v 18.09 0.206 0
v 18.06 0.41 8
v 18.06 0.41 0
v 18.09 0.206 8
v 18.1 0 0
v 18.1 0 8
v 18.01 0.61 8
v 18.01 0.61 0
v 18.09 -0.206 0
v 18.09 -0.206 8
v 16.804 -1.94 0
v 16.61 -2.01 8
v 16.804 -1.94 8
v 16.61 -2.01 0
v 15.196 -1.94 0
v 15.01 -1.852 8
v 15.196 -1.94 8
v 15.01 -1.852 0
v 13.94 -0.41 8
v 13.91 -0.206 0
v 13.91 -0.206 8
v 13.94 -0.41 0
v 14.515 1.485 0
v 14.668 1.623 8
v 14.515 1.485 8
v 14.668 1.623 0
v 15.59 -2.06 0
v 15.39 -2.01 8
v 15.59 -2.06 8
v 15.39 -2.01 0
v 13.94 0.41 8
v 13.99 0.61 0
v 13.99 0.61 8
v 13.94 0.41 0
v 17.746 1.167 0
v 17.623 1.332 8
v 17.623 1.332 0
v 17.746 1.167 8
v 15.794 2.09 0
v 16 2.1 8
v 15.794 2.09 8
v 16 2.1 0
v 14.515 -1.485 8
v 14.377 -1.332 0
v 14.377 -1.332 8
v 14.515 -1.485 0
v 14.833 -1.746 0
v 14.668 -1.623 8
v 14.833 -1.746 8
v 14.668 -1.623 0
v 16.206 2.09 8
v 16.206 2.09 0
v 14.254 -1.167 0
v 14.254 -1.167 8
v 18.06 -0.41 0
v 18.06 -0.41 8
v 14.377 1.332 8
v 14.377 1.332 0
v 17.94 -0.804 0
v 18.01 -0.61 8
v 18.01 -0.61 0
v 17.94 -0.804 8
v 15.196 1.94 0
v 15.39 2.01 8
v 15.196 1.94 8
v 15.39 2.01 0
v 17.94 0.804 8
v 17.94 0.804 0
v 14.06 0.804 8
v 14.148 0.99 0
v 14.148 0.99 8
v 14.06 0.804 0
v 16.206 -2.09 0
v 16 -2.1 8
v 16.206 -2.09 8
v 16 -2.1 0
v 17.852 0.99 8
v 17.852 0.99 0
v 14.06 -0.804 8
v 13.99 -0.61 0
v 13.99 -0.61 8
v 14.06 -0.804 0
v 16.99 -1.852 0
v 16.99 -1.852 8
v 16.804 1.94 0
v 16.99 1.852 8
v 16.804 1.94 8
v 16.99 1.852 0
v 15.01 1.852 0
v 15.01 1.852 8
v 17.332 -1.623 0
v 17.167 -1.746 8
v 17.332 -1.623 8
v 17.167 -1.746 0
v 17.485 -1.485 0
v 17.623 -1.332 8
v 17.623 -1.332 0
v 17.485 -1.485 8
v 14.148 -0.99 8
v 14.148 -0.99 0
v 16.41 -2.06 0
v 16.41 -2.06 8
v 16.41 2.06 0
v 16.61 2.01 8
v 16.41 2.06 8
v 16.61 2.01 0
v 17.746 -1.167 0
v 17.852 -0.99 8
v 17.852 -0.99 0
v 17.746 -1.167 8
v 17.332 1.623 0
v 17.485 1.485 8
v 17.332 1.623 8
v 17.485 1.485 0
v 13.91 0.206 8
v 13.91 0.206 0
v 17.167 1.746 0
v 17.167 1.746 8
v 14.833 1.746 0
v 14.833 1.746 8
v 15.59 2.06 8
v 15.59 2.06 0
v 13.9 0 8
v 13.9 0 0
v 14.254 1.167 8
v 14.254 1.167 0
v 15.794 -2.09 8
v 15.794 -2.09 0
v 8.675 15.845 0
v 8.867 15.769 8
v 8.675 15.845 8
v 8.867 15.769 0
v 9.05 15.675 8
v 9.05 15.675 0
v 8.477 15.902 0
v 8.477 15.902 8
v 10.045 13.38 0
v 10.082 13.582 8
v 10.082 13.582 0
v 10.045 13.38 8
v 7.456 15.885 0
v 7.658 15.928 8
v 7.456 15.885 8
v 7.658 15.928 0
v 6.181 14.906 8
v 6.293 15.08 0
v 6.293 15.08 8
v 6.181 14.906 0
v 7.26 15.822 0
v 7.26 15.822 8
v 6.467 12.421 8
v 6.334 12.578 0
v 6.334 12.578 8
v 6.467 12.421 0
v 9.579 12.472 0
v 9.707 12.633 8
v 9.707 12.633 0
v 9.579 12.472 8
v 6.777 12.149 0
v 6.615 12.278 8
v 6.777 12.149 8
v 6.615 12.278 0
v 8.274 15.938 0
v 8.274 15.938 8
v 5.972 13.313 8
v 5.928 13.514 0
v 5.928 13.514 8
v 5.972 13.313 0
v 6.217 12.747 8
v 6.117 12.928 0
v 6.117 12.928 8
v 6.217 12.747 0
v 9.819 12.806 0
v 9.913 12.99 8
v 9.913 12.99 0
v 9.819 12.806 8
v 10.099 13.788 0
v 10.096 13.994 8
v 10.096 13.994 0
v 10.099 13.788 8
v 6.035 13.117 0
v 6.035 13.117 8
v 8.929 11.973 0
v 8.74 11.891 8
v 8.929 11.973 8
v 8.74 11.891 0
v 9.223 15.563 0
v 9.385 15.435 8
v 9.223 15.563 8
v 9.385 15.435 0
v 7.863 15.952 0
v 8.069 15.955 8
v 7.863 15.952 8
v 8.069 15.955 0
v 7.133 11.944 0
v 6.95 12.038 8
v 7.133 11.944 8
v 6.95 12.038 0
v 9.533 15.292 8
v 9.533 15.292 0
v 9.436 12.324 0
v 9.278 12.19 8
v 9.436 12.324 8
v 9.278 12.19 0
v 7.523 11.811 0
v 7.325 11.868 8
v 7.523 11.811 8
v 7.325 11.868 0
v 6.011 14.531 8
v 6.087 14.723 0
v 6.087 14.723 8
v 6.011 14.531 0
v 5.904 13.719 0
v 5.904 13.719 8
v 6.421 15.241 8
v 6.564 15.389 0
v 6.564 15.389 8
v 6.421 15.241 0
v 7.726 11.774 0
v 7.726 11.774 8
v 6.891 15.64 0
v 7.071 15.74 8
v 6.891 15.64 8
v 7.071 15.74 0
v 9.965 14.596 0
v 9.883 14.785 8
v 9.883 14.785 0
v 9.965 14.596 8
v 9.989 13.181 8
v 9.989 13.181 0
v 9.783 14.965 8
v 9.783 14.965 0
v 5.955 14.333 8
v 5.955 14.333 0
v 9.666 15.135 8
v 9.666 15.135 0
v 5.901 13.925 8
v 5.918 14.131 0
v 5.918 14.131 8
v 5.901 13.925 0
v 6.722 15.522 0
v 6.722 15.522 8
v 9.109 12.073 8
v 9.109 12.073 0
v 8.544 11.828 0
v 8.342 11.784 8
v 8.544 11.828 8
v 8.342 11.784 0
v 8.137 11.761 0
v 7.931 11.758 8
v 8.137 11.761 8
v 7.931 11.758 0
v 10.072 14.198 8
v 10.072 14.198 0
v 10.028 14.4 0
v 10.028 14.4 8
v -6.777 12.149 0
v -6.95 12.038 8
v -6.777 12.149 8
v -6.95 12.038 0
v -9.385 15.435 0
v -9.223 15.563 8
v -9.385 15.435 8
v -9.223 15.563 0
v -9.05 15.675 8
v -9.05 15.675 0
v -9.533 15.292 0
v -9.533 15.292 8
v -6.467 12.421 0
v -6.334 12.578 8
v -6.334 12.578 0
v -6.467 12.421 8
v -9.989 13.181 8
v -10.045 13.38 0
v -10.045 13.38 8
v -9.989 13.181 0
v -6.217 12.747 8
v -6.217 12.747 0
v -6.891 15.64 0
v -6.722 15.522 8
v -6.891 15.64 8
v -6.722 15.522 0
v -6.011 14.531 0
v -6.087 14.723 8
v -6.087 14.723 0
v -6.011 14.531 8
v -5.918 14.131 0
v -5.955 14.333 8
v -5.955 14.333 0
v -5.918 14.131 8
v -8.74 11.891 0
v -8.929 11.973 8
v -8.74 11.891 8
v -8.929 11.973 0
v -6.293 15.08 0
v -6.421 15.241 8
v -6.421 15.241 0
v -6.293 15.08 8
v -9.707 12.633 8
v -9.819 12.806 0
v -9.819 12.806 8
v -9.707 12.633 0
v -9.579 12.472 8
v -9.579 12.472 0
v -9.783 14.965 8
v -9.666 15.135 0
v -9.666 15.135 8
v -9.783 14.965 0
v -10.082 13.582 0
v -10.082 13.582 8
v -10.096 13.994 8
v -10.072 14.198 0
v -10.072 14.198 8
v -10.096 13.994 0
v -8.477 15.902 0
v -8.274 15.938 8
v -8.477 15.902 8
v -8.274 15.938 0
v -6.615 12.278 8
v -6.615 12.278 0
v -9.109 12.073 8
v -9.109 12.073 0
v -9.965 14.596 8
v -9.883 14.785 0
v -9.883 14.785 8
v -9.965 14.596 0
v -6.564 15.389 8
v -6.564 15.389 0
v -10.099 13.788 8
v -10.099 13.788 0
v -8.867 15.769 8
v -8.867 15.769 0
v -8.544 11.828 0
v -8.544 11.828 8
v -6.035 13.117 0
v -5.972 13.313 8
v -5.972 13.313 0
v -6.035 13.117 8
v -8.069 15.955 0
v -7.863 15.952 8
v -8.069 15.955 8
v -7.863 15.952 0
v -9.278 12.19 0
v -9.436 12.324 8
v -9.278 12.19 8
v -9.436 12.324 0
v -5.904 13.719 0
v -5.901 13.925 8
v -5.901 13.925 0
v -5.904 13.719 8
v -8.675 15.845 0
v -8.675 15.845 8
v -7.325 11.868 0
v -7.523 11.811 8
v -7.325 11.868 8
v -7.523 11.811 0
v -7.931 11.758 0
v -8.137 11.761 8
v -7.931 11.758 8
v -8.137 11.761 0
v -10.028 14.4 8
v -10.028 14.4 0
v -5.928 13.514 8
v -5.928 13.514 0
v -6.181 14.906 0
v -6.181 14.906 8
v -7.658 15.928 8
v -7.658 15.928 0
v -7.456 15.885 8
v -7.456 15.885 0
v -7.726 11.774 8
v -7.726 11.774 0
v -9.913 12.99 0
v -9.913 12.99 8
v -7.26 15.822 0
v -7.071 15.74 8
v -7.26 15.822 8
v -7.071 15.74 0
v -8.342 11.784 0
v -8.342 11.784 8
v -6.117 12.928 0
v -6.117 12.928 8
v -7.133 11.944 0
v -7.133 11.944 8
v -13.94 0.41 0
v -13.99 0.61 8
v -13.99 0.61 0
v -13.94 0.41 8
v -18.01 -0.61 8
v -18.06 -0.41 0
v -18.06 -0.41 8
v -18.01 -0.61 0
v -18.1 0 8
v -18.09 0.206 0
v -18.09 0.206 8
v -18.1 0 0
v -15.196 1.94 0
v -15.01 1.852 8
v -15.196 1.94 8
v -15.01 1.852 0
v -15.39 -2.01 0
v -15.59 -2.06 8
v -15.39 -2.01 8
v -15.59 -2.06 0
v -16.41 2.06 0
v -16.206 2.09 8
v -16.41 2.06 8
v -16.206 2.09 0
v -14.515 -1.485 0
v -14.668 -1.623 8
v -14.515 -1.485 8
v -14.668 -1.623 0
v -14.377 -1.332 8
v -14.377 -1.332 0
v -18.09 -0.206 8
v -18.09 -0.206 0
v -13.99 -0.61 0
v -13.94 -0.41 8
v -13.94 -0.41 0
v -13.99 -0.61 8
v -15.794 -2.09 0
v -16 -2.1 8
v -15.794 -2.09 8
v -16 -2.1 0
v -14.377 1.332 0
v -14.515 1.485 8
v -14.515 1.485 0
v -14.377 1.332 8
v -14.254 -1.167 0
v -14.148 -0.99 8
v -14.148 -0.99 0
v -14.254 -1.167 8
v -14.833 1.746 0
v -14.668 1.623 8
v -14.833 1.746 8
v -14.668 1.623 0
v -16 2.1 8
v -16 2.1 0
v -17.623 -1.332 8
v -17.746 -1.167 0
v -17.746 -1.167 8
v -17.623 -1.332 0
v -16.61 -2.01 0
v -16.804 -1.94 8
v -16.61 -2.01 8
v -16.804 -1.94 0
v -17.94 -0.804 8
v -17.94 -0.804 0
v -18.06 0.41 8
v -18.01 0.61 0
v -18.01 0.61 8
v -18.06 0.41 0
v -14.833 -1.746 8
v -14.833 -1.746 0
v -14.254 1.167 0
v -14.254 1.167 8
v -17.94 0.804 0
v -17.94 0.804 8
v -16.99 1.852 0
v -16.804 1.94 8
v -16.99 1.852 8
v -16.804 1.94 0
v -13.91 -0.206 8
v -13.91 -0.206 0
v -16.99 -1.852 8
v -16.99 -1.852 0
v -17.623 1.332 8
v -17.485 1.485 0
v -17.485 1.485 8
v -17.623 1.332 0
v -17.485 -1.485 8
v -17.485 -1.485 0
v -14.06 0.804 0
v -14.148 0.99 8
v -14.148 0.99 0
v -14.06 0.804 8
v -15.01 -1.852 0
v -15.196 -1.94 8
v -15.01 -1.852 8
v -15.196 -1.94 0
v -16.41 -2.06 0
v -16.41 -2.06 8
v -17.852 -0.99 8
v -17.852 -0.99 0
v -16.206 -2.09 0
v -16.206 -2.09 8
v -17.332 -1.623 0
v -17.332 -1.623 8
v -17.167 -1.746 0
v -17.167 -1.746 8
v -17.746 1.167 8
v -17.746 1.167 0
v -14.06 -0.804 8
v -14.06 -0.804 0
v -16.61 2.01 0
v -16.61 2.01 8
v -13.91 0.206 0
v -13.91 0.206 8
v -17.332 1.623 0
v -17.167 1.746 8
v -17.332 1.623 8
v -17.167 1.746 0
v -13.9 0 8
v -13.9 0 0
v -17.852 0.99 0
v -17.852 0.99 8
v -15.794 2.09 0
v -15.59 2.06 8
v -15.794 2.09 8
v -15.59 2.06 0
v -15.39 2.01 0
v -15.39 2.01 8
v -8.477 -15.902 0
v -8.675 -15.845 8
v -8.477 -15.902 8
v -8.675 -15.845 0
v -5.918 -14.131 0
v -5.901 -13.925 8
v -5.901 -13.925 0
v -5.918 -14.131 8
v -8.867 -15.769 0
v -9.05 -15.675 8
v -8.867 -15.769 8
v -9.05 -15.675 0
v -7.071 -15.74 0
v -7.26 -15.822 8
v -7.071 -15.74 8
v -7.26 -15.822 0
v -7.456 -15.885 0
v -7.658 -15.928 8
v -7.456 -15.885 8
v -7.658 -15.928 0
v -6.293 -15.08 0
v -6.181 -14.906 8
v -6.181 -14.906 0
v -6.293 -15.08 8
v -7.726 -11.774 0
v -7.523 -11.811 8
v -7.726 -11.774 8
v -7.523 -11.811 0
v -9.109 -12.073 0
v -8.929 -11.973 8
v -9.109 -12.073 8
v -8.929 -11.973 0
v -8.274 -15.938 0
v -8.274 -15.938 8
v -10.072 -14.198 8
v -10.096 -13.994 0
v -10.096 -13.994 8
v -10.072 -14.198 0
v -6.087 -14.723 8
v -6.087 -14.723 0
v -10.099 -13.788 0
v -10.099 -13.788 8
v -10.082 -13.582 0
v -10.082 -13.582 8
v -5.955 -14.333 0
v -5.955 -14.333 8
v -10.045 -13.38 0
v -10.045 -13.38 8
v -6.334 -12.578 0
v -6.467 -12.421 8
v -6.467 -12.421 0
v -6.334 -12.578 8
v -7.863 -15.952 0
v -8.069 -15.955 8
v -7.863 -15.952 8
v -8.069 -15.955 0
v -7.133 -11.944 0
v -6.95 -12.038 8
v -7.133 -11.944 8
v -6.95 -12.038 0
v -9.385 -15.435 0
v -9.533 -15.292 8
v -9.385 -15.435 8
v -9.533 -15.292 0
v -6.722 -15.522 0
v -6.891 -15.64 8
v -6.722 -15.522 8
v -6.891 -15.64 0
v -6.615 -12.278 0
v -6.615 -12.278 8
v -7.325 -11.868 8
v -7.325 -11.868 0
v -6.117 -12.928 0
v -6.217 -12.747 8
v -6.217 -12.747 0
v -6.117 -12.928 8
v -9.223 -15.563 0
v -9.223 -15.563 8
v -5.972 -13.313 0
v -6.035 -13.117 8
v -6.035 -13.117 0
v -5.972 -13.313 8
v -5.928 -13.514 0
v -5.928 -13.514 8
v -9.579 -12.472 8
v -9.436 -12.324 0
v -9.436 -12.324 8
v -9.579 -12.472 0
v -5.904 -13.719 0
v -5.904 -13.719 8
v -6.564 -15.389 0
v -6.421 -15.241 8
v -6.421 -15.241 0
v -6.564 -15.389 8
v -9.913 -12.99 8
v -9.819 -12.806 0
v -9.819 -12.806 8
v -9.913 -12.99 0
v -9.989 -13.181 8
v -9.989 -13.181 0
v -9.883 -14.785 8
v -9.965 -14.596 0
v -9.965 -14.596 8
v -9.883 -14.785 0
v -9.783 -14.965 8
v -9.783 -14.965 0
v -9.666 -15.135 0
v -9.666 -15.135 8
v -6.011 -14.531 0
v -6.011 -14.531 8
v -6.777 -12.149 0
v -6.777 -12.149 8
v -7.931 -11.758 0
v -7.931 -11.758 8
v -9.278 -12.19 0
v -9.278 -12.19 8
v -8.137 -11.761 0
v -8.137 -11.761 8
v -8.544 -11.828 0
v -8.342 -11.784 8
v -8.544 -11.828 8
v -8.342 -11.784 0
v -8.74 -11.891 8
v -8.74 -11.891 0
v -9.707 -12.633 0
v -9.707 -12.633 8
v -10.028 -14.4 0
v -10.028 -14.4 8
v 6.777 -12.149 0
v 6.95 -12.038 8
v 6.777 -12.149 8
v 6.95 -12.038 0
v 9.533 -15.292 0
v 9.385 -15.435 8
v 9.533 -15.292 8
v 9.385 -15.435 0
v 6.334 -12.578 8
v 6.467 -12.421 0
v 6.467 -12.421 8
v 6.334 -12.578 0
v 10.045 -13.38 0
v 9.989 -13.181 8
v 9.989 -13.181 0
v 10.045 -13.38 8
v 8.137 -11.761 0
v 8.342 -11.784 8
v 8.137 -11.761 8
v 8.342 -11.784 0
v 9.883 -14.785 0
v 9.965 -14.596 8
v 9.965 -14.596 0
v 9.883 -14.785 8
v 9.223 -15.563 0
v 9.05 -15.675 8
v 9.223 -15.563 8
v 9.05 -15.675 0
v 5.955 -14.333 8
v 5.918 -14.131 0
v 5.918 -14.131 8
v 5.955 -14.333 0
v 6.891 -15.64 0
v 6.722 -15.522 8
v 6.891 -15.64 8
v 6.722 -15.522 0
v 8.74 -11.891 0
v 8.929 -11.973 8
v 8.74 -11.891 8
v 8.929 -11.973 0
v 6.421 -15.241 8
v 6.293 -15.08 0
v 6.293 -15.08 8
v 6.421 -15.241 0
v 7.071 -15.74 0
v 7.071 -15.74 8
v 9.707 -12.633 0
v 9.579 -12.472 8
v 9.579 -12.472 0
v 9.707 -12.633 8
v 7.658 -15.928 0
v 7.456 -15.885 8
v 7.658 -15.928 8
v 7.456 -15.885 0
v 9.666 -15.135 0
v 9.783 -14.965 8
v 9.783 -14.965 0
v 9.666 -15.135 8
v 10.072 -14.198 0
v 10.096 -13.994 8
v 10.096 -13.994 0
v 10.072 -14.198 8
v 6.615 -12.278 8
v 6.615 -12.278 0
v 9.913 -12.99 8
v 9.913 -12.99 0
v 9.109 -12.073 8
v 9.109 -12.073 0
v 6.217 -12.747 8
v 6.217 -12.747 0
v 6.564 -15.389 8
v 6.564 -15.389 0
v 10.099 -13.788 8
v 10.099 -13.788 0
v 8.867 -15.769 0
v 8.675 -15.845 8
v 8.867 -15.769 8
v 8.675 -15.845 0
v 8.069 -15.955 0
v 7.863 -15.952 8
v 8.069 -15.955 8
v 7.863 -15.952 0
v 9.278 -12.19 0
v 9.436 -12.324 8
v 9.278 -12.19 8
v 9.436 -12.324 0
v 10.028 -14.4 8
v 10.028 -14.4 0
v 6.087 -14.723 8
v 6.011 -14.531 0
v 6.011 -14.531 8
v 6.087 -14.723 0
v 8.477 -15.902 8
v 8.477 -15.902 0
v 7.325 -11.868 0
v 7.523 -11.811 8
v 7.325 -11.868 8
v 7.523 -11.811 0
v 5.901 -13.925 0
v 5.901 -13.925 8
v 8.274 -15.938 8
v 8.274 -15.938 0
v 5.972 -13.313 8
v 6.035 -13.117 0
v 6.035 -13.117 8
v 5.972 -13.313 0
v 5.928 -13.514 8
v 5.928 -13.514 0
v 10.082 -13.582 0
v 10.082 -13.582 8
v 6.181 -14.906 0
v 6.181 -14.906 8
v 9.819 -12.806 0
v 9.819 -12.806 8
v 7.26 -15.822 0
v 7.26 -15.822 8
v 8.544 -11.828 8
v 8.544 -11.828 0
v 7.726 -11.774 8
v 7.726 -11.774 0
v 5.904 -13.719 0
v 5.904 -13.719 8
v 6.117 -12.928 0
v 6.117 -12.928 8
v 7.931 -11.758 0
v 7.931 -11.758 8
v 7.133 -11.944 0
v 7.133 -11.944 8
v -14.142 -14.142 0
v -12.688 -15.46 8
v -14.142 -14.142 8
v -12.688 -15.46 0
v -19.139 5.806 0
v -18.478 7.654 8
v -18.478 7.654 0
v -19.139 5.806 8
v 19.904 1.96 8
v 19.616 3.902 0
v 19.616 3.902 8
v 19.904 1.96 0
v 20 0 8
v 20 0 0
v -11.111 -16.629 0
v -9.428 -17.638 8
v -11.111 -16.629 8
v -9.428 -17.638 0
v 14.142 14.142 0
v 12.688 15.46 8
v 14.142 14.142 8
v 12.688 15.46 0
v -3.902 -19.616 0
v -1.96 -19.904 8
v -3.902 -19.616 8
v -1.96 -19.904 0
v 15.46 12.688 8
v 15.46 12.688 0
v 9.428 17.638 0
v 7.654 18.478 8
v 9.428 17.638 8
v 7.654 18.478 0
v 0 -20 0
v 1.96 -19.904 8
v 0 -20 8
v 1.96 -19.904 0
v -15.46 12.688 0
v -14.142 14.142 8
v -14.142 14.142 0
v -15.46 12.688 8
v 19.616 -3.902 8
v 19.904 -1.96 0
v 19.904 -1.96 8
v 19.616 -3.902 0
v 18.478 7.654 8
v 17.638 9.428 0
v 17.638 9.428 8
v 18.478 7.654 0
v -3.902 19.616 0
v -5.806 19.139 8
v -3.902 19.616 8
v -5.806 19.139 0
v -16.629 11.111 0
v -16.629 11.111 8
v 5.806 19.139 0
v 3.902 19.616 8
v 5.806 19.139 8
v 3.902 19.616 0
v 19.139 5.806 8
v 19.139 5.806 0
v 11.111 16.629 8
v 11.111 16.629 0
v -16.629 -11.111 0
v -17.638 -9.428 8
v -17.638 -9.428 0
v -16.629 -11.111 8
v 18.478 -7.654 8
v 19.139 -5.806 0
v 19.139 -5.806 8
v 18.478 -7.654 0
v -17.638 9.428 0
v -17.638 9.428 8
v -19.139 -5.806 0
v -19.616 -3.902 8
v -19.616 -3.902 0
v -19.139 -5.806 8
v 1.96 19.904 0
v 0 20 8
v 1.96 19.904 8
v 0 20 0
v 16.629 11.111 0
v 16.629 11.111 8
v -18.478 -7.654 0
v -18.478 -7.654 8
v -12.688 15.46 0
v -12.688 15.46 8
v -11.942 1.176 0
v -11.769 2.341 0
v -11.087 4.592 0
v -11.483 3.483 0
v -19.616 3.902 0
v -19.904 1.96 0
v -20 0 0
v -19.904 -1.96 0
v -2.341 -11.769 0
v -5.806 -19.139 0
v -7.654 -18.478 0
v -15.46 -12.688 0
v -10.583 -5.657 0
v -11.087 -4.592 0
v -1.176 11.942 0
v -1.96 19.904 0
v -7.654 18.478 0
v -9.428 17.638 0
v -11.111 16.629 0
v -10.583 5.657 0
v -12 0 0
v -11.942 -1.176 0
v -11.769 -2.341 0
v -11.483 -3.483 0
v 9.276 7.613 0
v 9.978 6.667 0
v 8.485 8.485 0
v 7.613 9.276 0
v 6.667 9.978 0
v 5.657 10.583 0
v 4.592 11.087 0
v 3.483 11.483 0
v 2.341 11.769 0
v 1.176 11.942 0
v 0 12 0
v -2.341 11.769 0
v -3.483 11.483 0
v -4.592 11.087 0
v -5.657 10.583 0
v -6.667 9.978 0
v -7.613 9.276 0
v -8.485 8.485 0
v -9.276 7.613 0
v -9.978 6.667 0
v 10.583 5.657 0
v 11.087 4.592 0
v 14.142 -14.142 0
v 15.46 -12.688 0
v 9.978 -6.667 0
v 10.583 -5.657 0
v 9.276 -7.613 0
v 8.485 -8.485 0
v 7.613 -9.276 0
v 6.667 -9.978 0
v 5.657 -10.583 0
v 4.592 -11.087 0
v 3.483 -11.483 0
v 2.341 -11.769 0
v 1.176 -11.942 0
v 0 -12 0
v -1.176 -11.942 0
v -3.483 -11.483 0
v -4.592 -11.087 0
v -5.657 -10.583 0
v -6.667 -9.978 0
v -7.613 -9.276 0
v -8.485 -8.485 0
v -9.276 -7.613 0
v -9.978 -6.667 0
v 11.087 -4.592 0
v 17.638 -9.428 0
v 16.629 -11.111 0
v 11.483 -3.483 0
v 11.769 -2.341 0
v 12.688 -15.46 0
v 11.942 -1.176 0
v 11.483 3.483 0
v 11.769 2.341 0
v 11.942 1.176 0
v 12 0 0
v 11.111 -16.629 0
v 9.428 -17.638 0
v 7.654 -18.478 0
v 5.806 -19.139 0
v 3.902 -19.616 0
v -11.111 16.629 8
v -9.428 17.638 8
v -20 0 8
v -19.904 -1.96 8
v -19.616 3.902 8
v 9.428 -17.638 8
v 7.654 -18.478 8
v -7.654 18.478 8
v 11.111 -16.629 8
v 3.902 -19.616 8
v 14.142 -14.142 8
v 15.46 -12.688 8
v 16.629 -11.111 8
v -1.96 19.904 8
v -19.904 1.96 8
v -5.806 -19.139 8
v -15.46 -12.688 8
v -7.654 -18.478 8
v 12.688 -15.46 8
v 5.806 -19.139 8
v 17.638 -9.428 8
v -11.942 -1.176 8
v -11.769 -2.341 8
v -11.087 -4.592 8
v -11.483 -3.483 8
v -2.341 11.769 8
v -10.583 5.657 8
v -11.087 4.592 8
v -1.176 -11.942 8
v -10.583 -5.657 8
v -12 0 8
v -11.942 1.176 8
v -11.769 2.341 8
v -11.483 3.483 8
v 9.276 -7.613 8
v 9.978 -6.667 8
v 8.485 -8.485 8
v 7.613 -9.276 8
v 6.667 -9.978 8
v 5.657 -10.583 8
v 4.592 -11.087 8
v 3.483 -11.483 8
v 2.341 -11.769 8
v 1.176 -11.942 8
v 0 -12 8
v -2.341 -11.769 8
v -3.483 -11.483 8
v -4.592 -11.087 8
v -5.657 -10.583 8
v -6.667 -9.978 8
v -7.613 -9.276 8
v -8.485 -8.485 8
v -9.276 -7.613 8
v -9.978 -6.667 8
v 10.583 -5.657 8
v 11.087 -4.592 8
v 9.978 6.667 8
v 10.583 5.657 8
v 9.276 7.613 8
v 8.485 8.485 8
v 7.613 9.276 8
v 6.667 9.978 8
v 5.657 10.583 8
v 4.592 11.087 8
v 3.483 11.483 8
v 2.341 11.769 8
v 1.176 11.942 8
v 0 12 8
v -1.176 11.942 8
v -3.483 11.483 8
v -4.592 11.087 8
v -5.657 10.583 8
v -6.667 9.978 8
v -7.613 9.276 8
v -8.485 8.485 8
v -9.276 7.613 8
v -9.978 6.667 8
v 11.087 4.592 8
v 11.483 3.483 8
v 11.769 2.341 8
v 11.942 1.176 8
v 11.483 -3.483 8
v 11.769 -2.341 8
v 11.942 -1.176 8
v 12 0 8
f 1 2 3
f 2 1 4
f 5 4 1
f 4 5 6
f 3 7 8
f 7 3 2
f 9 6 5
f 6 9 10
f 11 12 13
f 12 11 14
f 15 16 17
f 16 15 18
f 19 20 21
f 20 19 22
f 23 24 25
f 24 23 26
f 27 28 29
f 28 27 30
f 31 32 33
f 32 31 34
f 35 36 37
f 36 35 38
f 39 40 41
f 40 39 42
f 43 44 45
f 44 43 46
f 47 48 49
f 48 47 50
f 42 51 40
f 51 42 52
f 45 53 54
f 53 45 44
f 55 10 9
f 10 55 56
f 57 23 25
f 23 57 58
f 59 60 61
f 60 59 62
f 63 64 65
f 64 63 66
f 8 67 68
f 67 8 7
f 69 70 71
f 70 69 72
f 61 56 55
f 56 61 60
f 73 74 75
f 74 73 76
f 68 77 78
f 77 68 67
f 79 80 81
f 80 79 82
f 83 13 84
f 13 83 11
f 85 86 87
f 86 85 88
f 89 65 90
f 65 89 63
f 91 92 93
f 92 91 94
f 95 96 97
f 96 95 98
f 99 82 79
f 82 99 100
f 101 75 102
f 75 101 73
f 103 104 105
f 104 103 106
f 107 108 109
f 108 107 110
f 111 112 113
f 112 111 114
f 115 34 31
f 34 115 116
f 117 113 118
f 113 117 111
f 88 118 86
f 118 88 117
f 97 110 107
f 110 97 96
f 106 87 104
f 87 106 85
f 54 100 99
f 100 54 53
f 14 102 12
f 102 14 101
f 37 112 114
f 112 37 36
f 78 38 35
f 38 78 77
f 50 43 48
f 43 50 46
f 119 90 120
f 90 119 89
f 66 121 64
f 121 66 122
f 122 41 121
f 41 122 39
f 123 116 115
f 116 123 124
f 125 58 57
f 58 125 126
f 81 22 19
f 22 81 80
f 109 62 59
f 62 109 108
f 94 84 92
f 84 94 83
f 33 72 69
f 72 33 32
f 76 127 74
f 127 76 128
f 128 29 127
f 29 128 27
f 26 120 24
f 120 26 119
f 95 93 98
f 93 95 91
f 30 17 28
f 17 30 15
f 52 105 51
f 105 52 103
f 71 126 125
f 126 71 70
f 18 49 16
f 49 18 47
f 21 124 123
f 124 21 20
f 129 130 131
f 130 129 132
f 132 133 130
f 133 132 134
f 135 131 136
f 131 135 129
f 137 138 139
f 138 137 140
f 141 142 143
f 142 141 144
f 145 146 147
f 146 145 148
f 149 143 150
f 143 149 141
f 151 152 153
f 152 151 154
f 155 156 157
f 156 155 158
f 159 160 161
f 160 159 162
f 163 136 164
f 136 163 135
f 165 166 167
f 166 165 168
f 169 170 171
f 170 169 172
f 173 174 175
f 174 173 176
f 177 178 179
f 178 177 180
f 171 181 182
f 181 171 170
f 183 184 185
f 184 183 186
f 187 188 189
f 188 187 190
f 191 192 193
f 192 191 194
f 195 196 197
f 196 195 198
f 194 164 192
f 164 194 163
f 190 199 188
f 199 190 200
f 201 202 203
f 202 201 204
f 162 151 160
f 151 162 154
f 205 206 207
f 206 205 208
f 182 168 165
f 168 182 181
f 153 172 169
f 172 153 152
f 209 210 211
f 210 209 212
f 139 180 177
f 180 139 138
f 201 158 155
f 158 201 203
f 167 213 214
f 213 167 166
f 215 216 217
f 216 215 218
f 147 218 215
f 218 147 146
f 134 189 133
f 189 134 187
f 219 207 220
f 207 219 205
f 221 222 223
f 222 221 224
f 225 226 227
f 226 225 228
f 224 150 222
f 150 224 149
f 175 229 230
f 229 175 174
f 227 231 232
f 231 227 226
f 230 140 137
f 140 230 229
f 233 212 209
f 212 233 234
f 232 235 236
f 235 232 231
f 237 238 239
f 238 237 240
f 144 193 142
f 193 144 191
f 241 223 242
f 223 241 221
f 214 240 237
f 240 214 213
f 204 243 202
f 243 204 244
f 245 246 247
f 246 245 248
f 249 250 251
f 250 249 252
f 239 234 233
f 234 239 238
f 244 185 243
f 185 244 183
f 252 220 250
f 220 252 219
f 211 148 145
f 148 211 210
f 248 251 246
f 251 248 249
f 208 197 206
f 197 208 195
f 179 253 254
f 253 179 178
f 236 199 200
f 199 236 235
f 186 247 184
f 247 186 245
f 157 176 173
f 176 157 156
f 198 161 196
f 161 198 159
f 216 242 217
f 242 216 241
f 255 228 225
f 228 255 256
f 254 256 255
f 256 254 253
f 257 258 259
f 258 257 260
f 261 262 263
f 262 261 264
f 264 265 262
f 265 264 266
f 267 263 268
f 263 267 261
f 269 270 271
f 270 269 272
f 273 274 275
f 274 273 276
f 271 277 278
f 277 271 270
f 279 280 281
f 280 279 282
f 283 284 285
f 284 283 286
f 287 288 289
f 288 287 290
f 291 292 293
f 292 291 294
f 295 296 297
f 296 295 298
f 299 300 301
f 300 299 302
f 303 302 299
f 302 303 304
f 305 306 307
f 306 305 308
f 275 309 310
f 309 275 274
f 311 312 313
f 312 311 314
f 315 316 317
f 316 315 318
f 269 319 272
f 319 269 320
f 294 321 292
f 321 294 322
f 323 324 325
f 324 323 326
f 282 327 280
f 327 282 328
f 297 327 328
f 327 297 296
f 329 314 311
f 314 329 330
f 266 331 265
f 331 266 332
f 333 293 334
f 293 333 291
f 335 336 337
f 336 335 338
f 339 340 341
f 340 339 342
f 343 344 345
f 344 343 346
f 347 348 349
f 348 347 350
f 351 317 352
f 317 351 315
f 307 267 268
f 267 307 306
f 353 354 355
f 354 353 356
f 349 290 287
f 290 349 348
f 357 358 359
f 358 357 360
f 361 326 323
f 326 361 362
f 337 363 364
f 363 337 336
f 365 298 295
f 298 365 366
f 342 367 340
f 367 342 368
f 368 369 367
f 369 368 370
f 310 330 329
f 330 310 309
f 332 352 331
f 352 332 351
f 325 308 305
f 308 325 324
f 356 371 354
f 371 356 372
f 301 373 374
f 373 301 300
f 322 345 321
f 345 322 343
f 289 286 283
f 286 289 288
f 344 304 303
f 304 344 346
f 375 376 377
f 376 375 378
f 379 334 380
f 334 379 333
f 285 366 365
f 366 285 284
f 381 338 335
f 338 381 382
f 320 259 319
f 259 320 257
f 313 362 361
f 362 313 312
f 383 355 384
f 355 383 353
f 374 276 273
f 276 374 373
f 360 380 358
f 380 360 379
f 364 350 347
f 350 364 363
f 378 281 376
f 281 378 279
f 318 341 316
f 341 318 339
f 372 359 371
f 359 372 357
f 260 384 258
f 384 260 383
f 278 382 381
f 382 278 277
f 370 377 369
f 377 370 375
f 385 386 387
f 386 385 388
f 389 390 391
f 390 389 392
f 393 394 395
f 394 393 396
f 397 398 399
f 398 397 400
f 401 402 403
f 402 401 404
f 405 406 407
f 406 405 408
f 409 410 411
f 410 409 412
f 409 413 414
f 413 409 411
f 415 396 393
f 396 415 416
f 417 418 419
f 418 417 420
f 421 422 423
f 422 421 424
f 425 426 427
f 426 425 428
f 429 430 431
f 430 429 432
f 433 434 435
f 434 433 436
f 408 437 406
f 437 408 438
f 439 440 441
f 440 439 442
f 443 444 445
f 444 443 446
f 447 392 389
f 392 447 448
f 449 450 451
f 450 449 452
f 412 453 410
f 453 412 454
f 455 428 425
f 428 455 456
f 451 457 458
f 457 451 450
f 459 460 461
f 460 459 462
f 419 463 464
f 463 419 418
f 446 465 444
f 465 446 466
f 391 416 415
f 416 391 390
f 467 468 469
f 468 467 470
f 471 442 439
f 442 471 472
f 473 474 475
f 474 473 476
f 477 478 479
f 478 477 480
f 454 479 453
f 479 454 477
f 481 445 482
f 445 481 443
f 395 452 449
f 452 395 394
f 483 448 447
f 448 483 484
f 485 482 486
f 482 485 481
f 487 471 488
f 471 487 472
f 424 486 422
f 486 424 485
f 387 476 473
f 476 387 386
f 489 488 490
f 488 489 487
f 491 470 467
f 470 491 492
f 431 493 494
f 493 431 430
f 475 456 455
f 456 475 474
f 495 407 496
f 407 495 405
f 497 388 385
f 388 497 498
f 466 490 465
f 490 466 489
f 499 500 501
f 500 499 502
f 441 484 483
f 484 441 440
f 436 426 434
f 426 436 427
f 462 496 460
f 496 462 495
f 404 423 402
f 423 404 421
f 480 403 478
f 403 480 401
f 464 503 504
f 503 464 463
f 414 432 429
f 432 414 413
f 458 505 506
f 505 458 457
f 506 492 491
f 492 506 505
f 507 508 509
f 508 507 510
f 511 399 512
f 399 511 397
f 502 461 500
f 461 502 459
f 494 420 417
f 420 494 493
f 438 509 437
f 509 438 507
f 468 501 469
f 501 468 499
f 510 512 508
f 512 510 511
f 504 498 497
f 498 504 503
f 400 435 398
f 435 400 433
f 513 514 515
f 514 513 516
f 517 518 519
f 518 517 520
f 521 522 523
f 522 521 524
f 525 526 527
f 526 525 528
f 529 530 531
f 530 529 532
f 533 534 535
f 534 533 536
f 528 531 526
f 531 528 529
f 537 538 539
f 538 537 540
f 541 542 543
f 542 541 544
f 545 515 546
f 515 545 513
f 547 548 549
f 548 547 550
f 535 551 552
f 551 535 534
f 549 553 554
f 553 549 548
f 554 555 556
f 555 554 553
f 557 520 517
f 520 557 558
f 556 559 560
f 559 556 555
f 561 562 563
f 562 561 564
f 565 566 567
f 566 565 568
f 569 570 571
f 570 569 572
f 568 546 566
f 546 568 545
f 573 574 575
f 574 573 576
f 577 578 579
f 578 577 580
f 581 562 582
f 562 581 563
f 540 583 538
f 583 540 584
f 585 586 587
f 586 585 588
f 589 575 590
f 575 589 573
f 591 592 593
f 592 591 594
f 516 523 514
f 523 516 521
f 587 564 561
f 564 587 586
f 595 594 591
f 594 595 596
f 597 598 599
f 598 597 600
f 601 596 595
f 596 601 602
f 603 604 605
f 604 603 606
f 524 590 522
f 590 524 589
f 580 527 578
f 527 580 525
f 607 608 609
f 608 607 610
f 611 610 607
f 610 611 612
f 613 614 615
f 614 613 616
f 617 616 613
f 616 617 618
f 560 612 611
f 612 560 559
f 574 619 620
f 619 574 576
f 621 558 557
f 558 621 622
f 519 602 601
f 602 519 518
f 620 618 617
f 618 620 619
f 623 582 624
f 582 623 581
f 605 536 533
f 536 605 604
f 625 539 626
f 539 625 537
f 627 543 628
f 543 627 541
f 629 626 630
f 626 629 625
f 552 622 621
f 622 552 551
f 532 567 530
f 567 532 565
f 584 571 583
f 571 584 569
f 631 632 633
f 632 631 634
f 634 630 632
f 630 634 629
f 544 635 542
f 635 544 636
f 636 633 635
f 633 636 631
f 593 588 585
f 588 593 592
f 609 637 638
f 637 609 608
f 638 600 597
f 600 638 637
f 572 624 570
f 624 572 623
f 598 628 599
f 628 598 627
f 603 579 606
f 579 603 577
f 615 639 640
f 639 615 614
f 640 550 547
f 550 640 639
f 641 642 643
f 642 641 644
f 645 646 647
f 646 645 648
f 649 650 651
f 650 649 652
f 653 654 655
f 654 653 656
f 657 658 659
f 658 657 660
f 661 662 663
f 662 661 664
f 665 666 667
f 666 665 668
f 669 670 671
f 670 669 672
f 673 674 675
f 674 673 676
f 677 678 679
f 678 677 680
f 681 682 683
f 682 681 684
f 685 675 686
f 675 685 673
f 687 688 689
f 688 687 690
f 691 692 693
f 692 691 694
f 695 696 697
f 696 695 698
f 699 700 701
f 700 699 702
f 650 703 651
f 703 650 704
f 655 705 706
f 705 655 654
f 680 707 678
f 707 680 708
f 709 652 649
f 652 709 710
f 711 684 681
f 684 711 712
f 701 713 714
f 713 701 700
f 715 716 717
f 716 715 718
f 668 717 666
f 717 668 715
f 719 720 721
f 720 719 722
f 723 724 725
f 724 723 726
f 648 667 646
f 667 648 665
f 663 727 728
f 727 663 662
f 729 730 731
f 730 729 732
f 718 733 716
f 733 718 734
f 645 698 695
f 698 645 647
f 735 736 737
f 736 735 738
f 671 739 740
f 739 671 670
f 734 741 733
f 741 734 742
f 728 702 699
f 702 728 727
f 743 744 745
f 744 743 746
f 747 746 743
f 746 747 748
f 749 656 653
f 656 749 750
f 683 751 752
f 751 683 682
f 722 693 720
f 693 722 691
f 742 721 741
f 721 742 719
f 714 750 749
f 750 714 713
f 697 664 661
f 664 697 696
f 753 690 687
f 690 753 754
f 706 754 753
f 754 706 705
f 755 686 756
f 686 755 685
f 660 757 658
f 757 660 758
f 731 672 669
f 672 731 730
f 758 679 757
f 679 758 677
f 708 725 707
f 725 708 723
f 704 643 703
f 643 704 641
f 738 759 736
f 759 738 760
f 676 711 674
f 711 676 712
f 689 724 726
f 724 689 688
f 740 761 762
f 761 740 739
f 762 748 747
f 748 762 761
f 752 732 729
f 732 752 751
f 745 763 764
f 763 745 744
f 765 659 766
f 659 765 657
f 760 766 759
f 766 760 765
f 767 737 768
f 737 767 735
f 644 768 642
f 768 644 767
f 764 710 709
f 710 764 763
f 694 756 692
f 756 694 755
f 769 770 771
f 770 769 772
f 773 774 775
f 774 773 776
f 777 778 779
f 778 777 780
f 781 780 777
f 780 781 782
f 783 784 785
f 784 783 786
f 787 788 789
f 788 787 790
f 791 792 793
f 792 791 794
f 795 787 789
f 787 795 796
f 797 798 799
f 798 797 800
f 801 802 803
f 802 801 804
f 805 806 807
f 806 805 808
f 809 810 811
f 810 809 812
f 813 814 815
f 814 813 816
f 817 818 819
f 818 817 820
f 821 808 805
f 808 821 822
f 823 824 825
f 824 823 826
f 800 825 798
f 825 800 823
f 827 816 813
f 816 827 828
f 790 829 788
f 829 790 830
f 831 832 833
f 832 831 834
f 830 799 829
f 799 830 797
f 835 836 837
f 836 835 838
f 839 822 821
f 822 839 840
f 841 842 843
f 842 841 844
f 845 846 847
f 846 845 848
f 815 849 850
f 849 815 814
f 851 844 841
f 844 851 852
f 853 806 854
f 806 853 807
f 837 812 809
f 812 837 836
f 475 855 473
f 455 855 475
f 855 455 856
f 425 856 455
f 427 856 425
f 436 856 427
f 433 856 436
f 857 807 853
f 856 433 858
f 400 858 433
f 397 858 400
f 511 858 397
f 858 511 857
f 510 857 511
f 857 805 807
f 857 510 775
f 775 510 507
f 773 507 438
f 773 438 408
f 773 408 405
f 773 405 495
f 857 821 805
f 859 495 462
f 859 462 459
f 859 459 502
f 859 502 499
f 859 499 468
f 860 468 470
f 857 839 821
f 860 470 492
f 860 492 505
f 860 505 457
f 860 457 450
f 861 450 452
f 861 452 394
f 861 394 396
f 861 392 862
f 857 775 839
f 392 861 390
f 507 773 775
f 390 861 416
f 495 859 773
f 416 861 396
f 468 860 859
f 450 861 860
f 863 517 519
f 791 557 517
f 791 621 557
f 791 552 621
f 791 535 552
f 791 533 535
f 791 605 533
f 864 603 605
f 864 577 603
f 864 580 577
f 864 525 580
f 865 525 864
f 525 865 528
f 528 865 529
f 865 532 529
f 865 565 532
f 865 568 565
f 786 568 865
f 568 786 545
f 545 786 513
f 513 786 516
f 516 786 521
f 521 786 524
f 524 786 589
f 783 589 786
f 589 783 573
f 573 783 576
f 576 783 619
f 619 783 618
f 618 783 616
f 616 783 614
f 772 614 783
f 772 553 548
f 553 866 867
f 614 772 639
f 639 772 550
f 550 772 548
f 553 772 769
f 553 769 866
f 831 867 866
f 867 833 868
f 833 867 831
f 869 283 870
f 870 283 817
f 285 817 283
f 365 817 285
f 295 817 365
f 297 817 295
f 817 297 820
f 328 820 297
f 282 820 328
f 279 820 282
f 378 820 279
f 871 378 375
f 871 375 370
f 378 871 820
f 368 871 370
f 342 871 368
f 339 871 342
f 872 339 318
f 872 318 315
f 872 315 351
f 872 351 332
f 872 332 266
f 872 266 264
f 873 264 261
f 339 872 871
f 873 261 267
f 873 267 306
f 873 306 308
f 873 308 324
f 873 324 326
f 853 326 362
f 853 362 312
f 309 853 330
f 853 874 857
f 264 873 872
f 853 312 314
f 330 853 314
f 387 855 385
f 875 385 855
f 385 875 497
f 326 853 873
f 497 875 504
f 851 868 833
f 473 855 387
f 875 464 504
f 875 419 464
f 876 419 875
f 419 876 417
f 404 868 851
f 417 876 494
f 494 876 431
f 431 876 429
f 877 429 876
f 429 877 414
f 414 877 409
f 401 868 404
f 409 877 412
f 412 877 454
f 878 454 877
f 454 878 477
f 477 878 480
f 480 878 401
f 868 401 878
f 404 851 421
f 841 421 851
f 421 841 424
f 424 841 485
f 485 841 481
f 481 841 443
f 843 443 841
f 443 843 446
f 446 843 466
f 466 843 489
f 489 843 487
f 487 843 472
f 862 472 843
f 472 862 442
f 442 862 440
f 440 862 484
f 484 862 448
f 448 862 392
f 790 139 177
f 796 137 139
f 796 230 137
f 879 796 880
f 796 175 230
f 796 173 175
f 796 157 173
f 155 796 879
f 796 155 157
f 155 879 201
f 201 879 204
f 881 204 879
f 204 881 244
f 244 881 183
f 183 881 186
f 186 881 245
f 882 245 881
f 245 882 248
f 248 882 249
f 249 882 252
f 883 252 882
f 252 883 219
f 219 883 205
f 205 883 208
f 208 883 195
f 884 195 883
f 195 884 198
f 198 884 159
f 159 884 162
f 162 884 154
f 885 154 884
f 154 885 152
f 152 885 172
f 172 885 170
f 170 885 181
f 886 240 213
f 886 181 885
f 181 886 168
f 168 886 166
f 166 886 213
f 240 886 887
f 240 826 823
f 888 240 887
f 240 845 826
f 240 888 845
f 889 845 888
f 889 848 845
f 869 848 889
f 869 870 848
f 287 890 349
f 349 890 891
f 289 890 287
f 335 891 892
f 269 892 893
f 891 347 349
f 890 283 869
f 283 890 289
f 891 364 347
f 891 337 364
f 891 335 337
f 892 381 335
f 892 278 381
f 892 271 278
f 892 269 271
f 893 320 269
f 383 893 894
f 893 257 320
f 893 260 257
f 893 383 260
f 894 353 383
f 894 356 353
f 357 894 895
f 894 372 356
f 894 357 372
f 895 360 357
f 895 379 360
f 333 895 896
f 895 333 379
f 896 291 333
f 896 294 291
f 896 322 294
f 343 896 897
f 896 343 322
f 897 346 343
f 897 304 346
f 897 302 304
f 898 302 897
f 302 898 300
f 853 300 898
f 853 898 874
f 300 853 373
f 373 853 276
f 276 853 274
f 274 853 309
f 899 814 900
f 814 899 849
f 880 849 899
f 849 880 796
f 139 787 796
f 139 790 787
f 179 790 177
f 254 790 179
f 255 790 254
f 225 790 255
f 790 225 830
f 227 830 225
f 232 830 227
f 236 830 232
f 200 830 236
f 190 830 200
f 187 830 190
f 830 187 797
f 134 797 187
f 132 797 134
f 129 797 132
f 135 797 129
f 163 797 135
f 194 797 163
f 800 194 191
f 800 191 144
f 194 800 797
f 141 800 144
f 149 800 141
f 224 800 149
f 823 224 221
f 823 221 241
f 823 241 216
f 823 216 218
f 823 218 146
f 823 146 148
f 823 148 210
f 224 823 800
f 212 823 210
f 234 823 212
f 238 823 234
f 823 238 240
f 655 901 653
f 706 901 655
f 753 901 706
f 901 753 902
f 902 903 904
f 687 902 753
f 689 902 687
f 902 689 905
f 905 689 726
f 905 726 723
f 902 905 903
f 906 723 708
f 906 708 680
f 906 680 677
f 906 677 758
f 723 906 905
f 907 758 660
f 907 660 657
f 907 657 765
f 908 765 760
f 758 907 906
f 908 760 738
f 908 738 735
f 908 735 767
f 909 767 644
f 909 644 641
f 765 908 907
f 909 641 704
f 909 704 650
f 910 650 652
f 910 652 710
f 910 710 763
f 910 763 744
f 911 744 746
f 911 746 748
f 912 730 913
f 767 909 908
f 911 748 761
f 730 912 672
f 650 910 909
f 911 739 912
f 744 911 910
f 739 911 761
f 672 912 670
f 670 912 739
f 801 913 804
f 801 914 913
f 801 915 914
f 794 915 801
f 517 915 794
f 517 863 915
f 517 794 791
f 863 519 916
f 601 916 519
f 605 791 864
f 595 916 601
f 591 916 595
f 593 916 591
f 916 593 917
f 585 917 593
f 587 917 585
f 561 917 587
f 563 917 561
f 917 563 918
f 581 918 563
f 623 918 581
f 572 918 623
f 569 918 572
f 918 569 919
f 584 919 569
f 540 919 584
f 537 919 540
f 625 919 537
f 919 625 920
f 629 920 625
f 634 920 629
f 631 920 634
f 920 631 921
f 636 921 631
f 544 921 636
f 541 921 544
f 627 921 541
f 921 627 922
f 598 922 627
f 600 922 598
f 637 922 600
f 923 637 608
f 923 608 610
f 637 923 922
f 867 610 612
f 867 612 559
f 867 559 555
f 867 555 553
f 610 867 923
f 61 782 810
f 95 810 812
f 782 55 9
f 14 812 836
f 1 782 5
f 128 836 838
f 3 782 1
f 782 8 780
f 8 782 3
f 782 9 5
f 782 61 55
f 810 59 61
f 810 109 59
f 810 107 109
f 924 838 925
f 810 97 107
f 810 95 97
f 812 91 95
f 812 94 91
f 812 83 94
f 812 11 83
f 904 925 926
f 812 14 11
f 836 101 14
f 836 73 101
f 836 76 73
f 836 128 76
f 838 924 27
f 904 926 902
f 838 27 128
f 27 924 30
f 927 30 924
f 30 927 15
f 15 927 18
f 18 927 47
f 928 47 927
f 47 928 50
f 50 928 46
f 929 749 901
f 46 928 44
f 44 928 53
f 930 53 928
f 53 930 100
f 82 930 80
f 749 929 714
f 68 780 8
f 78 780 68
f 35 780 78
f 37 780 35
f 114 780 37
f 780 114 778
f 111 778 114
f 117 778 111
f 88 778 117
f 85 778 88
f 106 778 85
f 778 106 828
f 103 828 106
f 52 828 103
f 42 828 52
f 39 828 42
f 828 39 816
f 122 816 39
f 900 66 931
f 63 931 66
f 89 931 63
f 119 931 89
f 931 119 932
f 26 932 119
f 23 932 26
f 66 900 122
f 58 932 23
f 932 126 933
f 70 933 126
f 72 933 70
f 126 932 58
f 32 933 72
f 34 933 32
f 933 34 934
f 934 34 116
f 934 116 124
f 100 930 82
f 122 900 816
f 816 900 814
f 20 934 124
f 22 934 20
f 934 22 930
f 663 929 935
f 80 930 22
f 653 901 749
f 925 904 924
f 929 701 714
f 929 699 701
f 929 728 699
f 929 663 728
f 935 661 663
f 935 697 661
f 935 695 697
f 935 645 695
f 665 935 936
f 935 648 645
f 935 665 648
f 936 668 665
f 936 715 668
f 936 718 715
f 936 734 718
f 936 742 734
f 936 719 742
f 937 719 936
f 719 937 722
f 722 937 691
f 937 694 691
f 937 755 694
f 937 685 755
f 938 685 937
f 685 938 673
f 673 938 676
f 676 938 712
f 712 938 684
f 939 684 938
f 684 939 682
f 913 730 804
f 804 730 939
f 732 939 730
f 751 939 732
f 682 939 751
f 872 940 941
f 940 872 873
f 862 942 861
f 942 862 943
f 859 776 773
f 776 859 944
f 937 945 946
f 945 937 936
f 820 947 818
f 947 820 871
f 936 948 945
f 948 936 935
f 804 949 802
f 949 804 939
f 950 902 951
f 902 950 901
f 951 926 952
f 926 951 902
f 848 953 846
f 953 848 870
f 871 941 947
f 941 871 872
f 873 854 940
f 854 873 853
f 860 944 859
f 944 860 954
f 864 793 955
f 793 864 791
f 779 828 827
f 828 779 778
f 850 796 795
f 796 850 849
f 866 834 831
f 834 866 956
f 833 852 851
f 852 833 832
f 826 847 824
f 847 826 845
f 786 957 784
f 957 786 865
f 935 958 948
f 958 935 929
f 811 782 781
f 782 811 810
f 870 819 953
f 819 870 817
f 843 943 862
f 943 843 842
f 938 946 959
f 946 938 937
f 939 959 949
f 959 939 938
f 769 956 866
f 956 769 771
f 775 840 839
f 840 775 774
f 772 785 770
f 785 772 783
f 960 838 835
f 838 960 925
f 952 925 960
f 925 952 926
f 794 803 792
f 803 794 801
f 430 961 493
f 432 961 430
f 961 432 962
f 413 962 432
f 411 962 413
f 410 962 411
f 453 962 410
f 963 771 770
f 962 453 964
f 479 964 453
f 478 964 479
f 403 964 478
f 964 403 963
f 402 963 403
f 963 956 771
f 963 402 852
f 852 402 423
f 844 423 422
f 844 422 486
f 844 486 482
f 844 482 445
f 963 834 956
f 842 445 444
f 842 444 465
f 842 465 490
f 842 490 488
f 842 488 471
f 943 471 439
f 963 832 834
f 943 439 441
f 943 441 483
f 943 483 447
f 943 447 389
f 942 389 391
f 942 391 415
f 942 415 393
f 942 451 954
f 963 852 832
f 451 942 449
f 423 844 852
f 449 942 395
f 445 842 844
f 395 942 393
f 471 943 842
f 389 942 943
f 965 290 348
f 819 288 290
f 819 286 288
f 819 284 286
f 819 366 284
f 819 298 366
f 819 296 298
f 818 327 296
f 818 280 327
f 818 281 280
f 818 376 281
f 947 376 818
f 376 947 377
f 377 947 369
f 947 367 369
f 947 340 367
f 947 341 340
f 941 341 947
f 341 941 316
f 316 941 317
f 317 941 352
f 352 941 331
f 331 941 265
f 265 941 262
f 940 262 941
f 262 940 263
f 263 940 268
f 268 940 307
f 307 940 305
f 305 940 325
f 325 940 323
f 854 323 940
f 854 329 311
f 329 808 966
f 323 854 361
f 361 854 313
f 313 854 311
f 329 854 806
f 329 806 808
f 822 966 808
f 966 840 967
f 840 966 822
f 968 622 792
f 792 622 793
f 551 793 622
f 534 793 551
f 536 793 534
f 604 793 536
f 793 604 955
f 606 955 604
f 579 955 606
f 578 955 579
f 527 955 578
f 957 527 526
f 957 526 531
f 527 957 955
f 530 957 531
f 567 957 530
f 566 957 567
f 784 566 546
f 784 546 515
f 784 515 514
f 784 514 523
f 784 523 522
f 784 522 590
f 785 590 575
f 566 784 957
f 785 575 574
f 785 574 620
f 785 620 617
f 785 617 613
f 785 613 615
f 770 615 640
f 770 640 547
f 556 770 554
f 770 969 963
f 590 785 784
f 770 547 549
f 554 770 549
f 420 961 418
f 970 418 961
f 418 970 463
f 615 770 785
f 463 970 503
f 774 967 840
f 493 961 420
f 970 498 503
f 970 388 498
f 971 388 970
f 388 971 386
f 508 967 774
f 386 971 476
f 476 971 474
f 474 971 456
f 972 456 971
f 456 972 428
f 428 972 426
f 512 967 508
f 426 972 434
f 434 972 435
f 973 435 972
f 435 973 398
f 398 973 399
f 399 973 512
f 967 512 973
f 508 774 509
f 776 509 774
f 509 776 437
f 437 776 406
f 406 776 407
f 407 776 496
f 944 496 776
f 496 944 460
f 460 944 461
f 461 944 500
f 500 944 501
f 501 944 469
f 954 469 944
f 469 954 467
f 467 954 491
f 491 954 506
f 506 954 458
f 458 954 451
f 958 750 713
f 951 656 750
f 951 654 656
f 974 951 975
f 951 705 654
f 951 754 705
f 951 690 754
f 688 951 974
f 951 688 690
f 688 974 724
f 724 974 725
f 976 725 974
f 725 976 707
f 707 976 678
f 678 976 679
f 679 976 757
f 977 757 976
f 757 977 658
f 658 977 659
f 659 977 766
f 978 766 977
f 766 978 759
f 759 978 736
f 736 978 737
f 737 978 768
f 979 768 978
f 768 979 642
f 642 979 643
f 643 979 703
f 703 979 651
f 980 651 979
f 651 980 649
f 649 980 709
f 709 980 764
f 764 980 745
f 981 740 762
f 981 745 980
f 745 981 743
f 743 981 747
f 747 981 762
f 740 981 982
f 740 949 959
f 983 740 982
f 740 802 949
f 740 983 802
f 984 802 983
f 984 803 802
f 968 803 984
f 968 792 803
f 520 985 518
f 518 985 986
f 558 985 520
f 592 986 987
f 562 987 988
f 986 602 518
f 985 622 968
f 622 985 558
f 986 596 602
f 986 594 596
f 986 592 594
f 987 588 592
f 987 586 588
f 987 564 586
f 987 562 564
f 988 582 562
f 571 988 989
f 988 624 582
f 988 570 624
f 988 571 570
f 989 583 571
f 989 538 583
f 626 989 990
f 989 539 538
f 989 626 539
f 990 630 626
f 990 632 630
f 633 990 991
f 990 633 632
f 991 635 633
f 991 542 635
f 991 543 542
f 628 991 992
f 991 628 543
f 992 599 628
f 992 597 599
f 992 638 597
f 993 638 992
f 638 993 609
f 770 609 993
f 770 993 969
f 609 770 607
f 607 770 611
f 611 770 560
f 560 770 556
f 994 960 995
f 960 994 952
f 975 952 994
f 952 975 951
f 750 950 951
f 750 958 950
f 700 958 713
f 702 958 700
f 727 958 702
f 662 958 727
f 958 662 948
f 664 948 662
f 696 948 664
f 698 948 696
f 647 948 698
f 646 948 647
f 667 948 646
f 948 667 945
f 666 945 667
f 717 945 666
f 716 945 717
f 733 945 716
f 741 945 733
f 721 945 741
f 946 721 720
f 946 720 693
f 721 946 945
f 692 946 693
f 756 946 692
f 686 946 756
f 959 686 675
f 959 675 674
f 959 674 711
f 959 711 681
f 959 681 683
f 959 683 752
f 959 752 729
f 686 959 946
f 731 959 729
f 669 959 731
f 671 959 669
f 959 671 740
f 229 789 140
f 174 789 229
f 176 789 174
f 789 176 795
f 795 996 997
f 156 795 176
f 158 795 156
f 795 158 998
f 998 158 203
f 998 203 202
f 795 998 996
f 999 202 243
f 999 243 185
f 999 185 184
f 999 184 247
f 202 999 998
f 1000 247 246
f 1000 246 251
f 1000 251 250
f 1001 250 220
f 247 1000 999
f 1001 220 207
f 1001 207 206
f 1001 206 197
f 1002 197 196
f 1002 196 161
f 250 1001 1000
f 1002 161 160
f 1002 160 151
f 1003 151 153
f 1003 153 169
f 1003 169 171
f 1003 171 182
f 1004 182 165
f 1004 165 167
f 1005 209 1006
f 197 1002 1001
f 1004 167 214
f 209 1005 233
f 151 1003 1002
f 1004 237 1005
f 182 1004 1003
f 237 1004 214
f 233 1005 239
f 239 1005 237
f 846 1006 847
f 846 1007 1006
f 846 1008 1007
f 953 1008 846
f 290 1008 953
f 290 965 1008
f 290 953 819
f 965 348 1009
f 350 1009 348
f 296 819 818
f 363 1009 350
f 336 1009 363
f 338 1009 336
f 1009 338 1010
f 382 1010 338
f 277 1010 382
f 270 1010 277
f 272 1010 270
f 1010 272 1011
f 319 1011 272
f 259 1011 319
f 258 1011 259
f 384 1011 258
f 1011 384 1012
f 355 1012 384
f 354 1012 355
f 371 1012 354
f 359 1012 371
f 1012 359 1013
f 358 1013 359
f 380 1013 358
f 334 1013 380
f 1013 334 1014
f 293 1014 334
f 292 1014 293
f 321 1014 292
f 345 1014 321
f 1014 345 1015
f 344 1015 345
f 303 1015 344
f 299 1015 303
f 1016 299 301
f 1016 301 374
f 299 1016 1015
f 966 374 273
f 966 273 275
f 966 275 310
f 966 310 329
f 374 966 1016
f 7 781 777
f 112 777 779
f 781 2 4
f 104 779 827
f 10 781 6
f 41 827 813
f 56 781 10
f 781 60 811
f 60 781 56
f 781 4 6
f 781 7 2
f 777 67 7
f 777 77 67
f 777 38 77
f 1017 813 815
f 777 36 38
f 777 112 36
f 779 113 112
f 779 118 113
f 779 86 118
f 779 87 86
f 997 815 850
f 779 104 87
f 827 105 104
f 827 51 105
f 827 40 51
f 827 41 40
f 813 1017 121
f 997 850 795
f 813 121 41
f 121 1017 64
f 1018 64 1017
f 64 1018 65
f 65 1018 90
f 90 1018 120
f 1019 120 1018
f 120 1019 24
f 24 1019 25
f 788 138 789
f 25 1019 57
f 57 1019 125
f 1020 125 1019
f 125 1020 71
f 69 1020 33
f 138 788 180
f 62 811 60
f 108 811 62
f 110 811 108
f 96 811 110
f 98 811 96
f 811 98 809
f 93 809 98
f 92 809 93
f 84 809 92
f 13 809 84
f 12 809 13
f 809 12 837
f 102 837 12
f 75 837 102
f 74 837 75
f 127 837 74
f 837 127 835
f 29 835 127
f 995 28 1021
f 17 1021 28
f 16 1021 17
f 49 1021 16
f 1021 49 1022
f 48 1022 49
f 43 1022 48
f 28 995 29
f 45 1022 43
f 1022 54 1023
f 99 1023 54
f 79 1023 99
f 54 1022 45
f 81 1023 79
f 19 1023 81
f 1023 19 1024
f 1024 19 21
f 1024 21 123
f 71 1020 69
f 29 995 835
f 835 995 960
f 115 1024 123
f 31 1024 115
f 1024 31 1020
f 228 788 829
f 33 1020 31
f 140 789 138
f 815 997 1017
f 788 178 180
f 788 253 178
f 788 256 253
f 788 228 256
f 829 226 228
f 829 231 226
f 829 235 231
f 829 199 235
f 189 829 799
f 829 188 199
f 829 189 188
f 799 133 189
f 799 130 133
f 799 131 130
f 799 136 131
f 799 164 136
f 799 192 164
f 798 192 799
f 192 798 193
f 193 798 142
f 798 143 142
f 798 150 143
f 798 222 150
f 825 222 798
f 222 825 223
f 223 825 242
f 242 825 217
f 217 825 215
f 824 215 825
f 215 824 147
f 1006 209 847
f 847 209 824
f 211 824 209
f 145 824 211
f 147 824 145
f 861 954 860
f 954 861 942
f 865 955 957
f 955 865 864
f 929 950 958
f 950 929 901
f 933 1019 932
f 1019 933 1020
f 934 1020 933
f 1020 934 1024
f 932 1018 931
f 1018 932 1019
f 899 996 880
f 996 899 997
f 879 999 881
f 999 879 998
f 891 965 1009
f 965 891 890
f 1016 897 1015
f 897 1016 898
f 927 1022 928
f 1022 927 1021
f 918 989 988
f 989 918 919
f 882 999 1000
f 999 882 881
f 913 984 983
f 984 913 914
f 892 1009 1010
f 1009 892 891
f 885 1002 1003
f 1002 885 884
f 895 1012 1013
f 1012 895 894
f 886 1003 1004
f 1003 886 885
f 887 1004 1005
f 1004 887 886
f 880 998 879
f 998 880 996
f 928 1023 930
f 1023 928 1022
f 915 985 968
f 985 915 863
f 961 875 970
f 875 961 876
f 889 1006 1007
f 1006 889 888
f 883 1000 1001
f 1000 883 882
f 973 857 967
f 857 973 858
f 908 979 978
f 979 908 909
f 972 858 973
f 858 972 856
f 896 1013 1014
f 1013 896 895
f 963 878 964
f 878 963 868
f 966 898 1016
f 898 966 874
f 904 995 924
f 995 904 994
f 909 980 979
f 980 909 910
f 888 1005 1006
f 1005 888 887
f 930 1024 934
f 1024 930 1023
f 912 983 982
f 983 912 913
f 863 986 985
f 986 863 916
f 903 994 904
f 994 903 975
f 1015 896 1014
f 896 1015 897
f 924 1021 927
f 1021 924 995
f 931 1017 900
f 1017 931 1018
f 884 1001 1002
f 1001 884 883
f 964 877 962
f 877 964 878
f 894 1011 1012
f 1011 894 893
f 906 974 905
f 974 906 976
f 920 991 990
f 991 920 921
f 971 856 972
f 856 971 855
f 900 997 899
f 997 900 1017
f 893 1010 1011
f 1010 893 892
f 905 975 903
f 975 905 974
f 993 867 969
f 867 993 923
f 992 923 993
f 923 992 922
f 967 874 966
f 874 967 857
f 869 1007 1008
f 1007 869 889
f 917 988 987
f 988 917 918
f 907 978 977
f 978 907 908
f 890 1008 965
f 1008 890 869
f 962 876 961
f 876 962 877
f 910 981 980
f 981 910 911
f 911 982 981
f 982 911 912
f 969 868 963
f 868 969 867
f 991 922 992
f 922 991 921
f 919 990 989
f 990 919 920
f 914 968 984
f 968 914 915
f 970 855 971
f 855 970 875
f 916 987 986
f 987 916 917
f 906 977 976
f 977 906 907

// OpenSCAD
// flange with six bolt holes
$fn = 64;
od = 40; id = 24; thk = 8; bolt_d = 4.2; bolt_circle = 32;
module flange(outer, inner, t) {
  difference() {
    cylinder(h = t, d = outer);
    translate([0, 0, -1]) cylinder(h = t + 2, d = inner);
    for (i = [0 : 5])
      rotate([0, 0, i * 60])
        translate([bolt_circle / 2, 0, -1])
          cylinder(h = t + 2, d = bolt_d);
  }
}
flange(od, id, thk);
